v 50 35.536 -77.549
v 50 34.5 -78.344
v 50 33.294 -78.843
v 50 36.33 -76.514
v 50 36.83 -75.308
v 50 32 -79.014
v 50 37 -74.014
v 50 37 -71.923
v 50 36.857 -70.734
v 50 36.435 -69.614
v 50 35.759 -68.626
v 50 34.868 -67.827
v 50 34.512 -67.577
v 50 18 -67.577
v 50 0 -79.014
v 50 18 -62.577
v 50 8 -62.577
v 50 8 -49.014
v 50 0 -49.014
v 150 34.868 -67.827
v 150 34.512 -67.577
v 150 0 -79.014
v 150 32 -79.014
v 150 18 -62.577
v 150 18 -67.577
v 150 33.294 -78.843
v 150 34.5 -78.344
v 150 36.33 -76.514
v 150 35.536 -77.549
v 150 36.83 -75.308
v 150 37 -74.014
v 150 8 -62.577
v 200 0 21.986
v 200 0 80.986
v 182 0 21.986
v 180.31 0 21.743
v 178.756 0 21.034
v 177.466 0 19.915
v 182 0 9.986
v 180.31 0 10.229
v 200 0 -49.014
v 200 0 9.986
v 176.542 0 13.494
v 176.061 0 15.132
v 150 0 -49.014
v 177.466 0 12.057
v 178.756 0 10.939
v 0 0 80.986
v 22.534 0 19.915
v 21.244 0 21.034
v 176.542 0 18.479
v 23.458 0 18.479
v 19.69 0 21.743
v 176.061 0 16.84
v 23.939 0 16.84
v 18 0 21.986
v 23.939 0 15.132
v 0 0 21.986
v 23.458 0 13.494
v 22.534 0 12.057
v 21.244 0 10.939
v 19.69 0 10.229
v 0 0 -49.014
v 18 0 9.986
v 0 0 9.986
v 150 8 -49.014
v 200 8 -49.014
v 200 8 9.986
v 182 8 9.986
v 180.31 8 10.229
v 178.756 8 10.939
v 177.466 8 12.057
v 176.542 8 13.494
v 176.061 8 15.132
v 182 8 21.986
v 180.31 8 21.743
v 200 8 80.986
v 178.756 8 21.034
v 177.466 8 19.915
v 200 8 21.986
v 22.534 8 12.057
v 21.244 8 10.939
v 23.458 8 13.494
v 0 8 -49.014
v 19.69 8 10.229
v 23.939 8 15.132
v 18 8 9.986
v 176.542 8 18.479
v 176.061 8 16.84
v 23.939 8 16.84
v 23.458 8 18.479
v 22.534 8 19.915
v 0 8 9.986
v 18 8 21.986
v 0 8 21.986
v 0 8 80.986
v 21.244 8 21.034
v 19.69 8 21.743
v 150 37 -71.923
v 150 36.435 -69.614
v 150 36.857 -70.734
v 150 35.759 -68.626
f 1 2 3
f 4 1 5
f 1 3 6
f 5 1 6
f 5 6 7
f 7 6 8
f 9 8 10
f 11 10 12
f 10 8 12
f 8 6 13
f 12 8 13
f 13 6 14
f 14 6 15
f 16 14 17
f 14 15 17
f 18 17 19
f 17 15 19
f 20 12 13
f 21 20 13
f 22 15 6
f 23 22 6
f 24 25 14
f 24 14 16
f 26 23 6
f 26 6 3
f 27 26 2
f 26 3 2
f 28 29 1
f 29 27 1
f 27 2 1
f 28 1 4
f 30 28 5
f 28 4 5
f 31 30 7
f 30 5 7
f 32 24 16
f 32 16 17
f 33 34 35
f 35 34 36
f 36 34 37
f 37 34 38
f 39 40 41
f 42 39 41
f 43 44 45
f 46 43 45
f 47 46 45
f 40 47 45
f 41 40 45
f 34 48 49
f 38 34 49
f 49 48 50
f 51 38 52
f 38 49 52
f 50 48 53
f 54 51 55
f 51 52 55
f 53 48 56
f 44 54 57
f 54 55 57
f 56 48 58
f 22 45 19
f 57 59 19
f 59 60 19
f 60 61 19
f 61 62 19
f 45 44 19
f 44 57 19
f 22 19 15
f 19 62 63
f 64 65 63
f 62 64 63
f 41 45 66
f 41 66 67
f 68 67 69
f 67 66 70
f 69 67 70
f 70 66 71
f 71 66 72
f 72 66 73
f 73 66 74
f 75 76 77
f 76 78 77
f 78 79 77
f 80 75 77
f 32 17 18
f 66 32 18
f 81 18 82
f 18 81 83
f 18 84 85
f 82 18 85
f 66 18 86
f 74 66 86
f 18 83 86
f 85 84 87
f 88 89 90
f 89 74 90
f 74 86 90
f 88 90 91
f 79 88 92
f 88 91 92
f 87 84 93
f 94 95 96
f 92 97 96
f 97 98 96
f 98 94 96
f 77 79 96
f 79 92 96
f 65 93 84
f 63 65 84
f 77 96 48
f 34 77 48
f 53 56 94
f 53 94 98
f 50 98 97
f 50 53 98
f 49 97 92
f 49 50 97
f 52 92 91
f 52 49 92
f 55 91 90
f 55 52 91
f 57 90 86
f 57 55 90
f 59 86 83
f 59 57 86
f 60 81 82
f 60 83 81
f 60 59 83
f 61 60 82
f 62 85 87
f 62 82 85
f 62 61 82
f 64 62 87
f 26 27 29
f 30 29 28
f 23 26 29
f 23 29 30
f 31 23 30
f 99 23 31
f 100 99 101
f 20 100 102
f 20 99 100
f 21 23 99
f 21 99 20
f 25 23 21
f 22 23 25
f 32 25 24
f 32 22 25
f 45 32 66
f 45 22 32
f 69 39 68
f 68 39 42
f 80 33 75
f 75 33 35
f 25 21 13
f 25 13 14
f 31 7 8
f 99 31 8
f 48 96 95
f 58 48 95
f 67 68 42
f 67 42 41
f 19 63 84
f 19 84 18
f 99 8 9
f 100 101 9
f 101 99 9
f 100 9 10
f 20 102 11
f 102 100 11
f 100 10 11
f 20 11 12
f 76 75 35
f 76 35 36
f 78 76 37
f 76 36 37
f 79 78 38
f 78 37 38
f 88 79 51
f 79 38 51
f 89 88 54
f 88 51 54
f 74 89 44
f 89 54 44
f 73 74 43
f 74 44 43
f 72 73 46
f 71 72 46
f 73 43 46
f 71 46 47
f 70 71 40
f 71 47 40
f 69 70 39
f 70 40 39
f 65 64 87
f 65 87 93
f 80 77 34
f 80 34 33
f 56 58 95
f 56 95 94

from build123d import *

# Parameters (mm, degrees)
EXTRUDE_1_DEPTH     = 200
SKETCH_2_W          = 50
SKETCH_2_H          = 30
CUT_EXTRUDE_1_DEPTH = 52
CUT_EXTRUDE_2_DEPTH = 10
CUT_EXTRUDE_4_DEPTH = 105.198677084


with BuildPart() as part:
    # Эскиз1 → Бобышка-Вытянуть1 (new body)
    with BuildSketch(Plane(origin=(0, 0, 0), x_dir=(0, 0, -1), z_dir=(1, 0, 0))):
        with BuildLine():
            Line((-80.986257223, 0), (79.013742777, 0))
            Line((79.013742777, 0), (79.013742777, 32))
            ThreePointArc((79.013742777, 32), (77.549276683, 35.535533906), (74.013742777, 37))
            Line((74.013742777, 37), (71.922596638, 37))
            ThreePointArc((71.922596638, 37), (69.613853571, 36.435054166), (67.826836416, 34.867882182))
            Line((67.826836416, 34.867882182), (49.013742777, 8))
            Line((49.013742777, 8), (-80.986257223, 8))
            Line((-80.986257223, 8), (-80.986257223, 0))
        make_face()
    extrude(amount=EXTRUDE_1_DEPTH)

    # Эскиз2 → Вырез-Вытянуть1 (cut)
    with BuildSketch(Plane.XZ):
        with Locations((25, -64.013742777)):
            Rectangle(SKETCH_2_W, SKETCH_2_H)
        with Locations((175, -64.013742777)):
            Rectangle(SKETCH_2_W, SKETCH_2_H)
    extrude(amount=-CUT_EXTRUDE_1_DEPTH, mode=Mode.SUBTRACT)

    # Эскиз3 → Вырез-Вытянуть2 (cut)
    with BuildSketch(Plane.XZ):
        with BuildLine():
            Line((18, 9.986257223), (0, 9.986257223))
            ThreePointArc((0, 9.986257223), (-6, 15.986257223), (0, 21.986257223))
            Line((0, 21.986257223), (18, 21.986257223))
            ThreePointArc((18, 21.986257223), (24, 15.986257223), (18, 9.986257223))
        make_face()
        with BuildLine():
            Line((182, 9.986257223), (200, 9.986257223))
            ThreePointArc((200, 9.986257223), (206, 15.986257223), (200, 21.986257223))
            Line((200, 21.986257223), (182, 21.986257223))
            ThreePointArc((182, 21.986257223), (176, 15.986257223), (182, 9.986257223))
        make_face()
    extrude(amount=-CUT_EXTRUDE_2_DEPTH, mode=Mode.SUBTRACT)

    # Эскиз4 → Вырез-Вытянуть4 (cut)
    with BuildSketch(Plane(origin=(150, 0, 0), x_dir=(0, 0, -1), z_dir=(1, 0, 0))):
        Polygon((67.577347999, 37), (67.577347999, 18), (62.577347999, 18), (62.577347999, 8), (49.013742777, 8), (49.013742777, 37), align=None)
    extrude(amount=-CUT_EXTRUDE_4_DEPTH, mode=Mode.SUBTRACT)


solid = part.part
